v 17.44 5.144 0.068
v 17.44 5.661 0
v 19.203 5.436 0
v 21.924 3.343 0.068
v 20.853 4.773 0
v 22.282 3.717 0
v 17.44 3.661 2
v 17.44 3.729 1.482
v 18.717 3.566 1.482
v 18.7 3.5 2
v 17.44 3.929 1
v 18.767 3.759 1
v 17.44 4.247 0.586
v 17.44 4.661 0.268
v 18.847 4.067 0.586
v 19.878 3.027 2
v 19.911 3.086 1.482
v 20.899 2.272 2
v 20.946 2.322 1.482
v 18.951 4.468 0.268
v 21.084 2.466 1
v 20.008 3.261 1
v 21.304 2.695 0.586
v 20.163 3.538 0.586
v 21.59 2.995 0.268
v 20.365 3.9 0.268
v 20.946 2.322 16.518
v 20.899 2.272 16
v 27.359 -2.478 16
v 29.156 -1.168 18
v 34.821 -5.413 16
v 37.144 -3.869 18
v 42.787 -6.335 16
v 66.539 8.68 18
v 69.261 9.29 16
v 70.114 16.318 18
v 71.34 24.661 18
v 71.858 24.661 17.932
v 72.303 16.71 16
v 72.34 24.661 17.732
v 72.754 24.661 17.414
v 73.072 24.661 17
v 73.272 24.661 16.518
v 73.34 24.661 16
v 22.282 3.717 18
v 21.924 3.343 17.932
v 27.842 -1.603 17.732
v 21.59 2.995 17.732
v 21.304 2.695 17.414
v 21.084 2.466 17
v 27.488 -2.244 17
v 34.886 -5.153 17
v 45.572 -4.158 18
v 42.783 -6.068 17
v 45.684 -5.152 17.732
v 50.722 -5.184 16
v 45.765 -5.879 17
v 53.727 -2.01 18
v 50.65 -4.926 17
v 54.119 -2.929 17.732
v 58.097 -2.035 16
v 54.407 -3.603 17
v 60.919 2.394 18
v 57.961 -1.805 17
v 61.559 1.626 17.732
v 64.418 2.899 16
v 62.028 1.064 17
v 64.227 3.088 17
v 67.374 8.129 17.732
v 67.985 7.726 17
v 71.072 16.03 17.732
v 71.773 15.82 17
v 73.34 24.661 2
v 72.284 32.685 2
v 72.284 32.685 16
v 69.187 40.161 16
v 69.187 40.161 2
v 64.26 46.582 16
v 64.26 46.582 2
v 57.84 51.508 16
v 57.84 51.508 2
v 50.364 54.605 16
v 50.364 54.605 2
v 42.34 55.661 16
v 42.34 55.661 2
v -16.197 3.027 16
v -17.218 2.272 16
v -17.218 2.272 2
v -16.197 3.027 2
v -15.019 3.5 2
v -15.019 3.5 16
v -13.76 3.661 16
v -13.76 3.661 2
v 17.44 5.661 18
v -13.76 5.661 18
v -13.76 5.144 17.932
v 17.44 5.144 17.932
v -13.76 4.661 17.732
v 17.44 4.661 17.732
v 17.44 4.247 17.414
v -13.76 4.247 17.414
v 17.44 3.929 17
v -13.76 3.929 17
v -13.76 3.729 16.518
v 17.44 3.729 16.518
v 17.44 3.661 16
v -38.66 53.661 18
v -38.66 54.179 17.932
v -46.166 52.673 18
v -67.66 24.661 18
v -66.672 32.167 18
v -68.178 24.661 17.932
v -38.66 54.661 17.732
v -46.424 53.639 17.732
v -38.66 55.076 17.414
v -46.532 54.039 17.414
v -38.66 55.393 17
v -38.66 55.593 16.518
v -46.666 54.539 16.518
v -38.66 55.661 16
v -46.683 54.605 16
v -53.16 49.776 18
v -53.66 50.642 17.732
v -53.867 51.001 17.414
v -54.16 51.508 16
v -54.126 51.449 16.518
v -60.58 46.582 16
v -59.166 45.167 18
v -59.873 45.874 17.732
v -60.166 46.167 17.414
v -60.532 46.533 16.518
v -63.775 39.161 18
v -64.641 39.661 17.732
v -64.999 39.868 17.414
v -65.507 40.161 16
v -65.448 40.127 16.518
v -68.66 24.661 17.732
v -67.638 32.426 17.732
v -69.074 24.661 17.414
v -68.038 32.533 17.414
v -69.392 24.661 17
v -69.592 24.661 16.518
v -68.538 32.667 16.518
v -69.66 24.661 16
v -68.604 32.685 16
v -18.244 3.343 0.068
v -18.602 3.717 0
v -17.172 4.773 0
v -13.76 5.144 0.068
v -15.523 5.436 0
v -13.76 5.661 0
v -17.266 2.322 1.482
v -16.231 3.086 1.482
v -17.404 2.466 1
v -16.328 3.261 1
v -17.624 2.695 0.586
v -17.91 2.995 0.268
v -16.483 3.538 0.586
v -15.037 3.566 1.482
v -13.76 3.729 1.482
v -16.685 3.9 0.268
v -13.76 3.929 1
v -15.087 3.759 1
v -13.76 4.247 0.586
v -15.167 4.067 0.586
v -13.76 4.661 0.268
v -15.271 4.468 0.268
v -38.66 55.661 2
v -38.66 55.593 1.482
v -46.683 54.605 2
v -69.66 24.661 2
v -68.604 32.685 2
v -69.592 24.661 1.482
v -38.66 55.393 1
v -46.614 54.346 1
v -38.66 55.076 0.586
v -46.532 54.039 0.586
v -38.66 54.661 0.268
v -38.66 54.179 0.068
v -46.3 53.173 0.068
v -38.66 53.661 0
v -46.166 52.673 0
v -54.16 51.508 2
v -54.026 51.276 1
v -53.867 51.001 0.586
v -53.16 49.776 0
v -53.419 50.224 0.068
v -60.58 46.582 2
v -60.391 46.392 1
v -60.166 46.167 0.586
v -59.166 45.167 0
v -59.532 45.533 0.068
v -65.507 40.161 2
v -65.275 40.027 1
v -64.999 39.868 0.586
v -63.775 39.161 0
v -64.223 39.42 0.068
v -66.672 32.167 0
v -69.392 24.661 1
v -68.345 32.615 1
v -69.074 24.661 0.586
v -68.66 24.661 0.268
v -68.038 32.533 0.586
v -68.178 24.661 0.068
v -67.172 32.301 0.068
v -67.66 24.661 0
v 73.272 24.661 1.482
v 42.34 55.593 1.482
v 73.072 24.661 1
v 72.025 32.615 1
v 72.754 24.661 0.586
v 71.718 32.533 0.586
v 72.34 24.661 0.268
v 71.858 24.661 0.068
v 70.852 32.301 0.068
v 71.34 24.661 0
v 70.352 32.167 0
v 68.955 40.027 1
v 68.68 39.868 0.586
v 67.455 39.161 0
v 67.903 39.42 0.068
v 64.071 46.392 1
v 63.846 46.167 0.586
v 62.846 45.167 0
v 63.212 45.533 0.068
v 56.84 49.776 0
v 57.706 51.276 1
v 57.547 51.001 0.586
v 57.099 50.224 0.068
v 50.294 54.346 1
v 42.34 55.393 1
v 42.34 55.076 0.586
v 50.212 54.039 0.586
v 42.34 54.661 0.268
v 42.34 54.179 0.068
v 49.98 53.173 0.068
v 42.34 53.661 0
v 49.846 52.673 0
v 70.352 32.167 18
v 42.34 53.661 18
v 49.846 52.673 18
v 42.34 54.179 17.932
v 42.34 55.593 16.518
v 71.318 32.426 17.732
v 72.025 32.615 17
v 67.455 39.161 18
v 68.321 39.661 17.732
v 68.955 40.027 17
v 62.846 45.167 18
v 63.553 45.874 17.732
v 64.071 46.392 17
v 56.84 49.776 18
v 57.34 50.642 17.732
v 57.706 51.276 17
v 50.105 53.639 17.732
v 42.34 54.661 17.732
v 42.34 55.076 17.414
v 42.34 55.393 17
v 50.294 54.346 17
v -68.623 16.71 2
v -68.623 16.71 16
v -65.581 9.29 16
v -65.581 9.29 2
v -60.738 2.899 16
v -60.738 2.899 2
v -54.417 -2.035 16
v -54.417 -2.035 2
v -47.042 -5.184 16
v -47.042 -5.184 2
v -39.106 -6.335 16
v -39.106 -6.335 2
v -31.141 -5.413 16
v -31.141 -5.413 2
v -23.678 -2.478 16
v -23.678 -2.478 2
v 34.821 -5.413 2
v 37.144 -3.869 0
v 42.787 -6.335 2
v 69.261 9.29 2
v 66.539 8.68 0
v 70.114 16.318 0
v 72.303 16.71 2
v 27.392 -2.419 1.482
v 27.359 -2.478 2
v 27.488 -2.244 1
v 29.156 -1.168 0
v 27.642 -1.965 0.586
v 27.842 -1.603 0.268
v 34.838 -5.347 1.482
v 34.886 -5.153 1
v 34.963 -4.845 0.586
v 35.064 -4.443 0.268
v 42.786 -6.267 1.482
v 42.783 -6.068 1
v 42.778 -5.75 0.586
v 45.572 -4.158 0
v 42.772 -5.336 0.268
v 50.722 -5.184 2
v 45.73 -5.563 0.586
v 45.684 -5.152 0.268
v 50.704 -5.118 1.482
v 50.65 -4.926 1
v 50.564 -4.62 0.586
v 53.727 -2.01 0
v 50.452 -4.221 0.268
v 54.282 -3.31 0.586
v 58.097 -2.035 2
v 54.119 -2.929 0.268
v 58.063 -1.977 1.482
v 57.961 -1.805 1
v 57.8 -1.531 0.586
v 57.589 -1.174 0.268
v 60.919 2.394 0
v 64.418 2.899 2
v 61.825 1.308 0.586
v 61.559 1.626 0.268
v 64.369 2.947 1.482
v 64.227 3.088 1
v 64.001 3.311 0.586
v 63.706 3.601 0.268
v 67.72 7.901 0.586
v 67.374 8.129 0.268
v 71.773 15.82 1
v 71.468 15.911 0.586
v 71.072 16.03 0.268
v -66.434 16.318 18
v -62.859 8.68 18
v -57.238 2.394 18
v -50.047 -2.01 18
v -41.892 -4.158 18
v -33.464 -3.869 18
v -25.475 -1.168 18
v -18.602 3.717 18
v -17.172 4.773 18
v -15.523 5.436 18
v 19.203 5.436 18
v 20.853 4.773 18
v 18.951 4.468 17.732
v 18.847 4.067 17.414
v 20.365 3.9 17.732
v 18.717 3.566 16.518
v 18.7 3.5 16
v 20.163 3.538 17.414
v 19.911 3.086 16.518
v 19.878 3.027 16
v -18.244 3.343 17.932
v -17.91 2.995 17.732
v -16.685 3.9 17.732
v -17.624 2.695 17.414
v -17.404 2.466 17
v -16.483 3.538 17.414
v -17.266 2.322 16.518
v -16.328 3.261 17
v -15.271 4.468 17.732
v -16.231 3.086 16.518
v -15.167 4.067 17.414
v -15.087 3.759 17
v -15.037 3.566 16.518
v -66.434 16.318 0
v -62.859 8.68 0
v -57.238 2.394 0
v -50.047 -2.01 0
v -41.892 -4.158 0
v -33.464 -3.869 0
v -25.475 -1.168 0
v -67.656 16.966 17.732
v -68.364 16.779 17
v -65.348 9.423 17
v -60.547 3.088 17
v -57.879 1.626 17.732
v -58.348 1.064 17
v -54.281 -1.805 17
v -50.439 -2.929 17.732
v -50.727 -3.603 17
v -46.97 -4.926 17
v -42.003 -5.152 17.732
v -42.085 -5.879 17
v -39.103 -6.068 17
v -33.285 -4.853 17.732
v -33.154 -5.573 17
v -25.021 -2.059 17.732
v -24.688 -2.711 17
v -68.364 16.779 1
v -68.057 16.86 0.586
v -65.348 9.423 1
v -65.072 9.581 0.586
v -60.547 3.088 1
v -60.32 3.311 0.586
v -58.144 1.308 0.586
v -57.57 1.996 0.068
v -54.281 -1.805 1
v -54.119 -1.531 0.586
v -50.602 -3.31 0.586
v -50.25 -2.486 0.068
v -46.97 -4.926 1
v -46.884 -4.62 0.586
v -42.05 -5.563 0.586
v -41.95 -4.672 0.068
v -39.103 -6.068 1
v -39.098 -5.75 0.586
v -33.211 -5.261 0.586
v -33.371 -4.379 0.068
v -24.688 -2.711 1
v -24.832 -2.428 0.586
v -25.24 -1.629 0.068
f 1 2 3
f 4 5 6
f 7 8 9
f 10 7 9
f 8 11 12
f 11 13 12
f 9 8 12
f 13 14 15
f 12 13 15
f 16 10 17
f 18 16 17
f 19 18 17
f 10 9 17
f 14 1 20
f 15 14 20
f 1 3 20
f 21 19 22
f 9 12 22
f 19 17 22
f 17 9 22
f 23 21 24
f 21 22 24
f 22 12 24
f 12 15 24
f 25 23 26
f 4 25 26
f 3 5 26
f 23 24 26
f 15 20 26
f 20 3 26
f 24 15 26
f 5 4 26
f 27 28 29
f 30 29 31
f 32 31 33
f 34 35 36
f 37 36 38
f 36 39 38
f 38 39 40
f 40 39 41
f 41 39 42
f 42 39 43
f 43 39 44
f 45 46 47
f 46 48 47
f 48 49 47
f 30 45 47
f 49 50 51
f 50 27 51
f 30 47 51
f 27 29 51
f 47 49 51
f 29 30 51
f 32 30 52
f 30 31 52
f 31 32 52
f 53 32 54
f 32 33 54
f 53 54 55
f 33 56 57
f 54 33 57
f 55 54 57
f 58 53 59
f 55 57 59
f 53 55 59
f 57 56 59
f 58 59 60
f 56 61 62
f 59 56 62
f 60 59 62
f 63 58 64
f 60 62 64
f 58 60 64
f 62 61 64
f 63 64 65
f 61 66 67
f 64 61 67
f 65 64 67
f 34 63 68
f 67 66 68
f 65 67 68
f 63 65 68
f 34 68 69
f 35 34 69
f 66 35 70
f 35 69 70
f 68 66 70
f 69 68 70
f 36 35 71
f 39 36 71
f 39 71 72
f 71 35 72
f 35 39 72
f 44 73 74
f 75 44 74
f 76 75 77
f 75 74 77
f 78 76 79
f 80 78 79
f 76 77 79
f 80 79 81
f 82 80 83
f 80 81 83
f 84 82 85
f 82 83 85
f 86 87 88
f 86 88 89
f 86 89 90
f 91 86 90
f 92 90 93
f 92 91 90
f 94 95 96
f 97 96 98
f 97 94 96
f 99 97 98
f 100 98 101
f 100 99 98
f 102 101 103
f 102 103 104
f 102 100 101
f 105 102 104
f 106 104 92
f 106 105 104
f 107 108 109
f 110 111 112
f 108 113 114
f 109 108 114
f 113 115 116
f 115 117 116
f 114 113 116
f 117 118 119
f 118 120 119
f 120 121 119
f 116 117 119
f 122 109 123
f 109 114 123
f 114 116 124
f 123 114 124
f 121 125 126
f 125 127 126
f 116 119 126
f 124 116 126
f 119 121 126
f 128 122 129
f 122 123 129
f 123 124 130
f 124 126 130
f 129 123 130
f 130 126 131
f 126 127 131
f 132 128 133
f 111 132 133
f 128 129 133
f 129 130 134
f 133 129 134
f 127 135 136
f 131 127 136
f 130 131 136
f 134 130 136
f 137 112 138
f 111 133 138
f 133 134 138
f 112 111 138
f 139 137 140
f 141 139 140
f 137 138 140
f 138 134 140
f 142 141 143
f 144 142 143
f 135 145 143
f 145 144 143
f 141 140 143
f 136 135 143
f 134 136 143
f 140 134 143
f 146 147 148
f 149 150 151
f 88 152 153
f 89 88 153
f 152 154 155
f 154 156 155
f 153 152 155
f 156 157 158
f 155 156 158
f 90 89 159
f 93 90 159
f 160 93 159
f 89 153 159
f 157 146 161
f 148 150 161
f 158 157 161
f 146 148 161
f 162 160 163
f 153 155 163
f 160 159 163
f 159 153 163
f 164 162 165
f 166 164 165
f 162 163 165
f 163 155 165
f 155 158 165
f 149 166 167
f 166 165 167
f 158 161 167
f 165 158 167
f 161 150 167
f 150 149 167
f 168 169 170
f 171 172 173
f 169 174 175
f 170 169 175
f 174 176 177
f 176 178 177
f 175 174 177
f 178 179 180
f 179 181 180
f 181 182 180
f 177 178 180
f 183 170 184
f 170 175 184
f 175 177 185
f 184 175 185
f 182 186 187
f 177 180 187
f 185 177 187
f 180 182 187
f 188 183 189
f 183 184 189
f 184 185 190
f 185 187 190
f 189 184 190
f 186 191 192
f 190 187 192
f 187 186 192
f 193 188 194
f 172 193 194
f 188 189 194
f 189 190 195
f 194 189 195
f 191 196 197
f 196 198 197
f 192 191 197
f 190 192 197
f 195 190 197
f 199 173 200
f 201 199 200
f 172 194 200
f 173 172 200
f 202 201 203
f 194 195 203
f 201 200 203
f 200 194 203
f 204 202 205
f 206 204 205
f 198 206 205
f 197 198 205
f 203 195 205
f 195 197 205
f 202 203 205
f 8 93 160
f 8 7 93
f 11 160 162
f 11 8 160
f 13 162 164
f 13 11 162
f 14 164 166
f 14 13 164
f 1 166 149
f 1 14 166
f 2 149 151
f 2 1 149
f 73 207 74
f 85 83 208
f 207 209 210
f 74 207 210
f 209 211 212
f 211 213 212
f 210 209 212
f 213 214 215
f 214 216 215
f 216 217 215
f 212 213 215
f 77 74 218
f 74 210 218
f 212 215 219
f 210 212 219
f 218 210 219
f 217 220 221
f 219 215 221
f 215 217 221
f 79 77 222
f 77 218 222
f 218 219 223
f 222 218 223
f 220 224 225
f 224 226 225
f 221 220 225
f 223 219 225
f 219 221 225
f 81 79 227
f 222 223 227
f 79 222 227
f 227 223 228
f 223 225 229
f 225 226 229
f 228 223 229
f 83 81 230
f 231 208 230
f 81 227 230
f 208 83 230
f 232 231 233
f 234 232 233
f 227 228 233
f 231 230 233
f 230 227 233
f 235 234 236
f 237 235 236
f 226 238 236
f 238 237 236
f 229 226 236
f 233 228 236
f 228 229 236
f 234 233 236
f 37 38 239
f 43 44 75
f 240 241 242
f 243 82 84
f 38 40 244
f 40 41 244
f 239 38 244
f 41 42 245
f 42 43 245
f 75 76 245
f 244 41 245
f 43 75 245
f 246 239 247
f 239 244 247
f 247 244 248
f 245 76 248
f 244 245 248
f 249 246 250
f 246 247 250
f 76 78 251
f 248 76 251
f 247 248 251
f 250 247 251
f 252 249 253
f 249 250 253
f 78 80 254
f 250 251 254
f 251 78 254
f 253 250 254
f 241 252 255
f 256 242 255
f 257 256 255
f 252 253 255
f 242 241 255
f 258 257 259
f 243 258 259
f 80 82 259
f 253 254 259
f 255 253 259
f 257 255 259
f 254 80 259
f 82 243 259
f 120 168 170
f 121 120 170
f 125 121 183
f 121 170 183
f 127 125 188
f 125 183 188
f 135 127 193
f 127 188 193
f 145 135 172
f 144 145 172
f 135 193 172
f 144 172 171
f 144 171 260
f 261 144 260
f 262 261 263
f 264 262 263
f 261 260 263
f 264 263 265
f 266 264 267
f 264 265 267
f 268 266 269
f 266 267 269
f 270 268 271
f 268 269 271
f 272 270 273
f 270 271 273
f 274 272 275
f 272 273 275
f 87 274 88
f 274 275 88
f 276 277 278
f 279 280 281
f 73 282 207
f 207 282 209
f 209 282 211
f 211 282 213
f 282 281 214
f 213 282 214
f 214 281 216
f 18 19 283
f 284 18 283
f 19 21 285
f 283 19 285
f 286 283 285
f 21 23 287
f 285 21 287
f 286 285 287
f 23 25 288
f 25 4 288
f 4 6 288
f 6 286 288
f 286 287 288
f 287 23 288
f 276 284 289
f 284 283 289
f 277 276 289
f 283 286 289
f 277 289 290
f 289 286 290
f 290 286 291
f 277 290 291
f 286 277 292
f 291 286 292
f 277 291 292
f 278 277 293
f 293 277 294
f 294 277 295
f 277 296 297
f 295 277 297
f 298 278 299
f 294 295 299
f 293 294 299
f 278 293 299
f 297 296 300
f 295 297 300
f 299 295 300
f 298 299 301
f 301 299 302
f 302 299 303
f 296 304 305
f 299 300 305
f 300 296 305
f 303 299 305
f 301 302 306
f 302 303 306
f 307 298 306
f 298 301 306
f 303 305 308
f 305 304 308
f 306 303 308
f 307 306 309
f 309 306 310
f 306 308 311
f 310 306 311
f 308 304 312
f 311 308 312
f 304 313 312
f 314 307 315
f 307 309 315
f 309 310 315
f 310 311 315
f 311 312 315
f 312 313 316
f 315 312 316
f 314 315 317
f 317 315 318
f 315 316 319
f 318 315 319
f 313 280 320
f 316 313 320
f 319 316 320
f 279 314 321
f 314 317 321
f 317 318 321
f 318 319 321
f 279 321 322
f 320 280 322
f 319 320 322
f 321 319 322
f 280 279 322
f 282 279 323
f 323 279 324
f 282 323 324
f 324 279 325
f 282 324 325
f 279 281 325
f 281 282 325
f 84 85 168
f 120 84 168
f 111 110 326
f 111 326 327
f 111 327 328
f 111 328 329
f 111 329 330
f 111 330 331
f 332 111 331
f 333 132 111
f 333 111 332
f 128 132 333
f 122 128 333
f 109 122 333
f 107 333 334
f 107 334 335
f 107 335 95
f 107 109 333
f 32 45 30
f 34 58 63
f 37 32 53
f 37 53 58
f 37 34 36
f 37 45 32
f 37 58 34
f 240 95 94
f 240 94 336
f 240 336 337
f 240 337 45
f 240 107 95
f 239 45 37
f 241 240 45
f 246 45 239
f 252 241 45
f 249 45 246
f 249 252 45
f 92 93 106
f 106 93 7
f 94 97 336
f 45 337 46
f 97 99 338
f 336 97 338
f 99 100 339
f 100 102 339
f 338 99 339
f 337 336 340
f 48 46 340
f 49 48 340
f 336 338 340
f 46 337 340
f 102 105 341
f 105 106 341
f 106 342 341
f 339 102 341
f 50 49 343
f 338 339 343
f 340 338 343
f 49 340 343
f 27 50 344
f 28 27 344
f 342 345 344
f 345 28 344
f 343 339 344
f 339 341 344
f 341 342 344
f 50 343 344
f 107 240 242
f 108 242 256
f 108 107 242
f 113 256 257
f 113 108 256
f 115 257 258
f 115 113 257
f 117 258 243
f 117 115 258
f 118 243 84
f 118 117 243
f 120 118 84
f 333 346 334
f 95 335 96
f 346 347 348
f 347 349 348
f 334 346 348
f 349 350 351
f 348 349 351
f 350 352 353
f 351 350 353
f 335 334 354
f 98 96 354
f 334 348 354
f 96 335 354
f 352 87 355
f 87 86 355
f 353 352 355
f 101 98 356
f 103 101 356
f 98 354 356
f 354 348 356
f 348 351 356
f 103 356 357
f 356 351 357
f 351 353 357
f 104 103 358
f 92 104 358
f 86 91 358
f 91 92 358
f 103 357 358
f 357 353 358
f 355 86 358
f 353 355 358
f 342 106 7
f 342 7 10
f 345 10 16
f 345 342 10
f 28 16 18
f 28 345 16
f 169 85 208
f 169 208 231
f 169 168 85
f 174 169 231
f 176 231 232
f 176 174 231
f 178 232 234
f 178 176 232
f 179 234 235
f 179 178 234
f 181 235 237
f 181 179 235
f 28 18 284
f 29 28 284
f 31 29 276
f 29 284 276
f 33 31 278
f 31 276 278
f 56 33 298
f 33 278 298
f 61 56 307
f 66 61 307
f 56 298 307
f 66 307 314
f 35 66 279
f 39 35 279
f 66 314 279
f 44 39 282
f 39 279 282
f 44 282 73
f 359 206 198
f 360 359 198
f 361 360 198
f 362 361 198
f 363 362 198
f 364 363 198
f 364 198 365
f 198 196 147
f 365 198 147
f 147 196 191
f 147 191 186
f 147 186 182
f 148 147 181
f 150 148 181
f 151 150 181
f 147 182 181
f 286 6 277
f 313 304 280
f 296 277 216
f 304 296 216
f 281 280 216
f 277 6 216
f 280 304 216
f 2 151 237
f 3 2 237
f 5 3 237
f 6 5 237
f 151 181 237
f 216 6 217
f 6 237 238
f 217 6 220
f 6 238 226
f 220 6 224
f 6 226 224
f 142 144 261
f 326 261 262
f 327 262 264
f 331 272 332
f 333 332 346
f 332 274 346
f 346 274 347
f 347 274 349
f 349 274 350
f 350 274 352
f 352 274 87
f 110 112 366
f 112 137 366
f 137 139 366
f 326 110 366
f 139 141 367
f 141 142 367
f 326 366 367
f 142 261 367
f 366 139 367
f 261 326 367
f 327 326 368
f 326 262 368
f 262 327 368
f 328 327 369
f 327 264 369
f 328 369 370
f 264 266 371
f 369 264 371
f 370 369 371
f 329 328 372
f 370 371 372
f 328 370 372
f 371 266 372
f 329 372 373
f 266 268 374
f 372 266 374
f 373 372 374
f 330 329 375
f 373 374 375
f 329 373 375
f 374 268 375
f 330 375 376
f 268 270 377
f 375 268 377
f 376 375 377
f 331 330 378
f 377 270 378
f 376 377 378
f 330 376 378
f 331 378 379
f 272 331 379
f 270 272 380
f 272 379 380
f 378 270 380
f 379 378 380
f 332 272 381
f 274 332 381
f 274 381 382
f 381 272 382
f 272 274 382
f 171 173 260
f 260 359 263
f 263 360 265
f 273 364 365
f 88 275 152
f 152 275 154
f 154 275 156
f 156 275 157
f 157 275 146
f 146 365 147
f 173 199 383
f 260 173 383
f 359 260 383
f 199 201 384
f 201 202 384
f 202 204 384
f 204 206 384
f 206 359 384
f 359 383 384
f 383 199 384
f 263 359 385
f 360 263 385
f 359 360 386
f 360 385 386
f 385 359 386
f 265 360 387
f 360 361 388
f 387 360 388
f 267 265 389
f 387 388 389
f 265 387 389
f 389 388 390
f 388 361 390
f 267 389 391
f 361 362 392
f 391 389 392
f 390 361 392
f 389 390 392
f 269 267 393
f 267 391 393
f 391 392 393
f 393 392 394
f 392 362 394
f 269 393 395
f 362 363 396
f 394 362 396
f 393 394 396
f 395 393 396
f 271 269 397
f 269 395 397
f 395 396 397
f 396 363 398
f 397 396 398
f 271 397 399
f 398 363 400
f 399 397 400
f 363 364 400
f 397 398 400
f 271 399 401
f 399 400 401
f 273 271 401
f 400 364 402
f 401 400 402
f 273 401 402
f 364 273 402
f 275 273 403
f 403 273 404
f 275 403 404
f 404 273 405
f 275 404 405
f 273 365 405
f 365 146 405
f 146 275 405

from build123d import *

# Parameters (mm, degrees)
F1_DEPTH = 18
F2_R     = 5
F3_R     = 2
F4_R     = 2


with BuildPart() as f1:
    # F0 (on Top) → F1 (new body)
    with BuildSketch(Plane.XY):
        with BuildLine():
            Line((42.340133, 55.661296), (-38.659867, 55.661296))
            ThreePointArc((-38.659867, 55.661296), (-60.580177, 46.581606), (-69.659867, 24.661296))
            ThreePointArc((-69.659867, 24.661296), (-49.931318, -4.216973), (-15.856358, 3.661296))
            Line((-15.856358, 3.661296), (1.840133, 3.661296))
            Line((1.840133, 3.661296), (19.536625, 3.661296))
            ThreePointArc((19.536625, 3.661296), (53.611585, -4.216973), (73.340133, 24.661296))
            ThreePointArc((73.340133, 24.661296), (64.260443, 46.581606), (42.340133, 55.661296))
        make_face()
    extrude(amount=F1_DEPTH)

    # F2
    f2_edges = [f1.edges().sort_by_distance(p)[0] for p in [
        (19.536625, 3.661296, 9),
        (-15.856358, 3.661296, 9),
    ]]
    fillet(f2_edges, radius=F2_R)

    # F3
    f3_edges = [f1.edges().sort_by_distance(p)[0] for p in [
        (71.106916, 13.108278, 18),
        (19.303724, 3.301099, 18),
        (1.840133, 55.661296, 18),
        (1.840133, 3.661296, 18),
        (-67.426649, 13.108278, 18),
        (-15.623458, 3.301099, 18),
    ]]
    fillet(f3_edges, radius=F3_R)

    # F4
    f4_edges = [f1.edges().sort_by_distance(p)[0] for p in [
        (-67.426649, 13.108278, 0),
        (-15.623458, 3.301099, 0),
        (1.840133, 55.661296, 0),
        (1.840133, 3.661296, 0),
        (71.106916, 13.108278, 0),
        (19.303724, 3.301099, 0),
    ]]
    fillet(f4_edges, radius=F4_R)


solid = f1.part
